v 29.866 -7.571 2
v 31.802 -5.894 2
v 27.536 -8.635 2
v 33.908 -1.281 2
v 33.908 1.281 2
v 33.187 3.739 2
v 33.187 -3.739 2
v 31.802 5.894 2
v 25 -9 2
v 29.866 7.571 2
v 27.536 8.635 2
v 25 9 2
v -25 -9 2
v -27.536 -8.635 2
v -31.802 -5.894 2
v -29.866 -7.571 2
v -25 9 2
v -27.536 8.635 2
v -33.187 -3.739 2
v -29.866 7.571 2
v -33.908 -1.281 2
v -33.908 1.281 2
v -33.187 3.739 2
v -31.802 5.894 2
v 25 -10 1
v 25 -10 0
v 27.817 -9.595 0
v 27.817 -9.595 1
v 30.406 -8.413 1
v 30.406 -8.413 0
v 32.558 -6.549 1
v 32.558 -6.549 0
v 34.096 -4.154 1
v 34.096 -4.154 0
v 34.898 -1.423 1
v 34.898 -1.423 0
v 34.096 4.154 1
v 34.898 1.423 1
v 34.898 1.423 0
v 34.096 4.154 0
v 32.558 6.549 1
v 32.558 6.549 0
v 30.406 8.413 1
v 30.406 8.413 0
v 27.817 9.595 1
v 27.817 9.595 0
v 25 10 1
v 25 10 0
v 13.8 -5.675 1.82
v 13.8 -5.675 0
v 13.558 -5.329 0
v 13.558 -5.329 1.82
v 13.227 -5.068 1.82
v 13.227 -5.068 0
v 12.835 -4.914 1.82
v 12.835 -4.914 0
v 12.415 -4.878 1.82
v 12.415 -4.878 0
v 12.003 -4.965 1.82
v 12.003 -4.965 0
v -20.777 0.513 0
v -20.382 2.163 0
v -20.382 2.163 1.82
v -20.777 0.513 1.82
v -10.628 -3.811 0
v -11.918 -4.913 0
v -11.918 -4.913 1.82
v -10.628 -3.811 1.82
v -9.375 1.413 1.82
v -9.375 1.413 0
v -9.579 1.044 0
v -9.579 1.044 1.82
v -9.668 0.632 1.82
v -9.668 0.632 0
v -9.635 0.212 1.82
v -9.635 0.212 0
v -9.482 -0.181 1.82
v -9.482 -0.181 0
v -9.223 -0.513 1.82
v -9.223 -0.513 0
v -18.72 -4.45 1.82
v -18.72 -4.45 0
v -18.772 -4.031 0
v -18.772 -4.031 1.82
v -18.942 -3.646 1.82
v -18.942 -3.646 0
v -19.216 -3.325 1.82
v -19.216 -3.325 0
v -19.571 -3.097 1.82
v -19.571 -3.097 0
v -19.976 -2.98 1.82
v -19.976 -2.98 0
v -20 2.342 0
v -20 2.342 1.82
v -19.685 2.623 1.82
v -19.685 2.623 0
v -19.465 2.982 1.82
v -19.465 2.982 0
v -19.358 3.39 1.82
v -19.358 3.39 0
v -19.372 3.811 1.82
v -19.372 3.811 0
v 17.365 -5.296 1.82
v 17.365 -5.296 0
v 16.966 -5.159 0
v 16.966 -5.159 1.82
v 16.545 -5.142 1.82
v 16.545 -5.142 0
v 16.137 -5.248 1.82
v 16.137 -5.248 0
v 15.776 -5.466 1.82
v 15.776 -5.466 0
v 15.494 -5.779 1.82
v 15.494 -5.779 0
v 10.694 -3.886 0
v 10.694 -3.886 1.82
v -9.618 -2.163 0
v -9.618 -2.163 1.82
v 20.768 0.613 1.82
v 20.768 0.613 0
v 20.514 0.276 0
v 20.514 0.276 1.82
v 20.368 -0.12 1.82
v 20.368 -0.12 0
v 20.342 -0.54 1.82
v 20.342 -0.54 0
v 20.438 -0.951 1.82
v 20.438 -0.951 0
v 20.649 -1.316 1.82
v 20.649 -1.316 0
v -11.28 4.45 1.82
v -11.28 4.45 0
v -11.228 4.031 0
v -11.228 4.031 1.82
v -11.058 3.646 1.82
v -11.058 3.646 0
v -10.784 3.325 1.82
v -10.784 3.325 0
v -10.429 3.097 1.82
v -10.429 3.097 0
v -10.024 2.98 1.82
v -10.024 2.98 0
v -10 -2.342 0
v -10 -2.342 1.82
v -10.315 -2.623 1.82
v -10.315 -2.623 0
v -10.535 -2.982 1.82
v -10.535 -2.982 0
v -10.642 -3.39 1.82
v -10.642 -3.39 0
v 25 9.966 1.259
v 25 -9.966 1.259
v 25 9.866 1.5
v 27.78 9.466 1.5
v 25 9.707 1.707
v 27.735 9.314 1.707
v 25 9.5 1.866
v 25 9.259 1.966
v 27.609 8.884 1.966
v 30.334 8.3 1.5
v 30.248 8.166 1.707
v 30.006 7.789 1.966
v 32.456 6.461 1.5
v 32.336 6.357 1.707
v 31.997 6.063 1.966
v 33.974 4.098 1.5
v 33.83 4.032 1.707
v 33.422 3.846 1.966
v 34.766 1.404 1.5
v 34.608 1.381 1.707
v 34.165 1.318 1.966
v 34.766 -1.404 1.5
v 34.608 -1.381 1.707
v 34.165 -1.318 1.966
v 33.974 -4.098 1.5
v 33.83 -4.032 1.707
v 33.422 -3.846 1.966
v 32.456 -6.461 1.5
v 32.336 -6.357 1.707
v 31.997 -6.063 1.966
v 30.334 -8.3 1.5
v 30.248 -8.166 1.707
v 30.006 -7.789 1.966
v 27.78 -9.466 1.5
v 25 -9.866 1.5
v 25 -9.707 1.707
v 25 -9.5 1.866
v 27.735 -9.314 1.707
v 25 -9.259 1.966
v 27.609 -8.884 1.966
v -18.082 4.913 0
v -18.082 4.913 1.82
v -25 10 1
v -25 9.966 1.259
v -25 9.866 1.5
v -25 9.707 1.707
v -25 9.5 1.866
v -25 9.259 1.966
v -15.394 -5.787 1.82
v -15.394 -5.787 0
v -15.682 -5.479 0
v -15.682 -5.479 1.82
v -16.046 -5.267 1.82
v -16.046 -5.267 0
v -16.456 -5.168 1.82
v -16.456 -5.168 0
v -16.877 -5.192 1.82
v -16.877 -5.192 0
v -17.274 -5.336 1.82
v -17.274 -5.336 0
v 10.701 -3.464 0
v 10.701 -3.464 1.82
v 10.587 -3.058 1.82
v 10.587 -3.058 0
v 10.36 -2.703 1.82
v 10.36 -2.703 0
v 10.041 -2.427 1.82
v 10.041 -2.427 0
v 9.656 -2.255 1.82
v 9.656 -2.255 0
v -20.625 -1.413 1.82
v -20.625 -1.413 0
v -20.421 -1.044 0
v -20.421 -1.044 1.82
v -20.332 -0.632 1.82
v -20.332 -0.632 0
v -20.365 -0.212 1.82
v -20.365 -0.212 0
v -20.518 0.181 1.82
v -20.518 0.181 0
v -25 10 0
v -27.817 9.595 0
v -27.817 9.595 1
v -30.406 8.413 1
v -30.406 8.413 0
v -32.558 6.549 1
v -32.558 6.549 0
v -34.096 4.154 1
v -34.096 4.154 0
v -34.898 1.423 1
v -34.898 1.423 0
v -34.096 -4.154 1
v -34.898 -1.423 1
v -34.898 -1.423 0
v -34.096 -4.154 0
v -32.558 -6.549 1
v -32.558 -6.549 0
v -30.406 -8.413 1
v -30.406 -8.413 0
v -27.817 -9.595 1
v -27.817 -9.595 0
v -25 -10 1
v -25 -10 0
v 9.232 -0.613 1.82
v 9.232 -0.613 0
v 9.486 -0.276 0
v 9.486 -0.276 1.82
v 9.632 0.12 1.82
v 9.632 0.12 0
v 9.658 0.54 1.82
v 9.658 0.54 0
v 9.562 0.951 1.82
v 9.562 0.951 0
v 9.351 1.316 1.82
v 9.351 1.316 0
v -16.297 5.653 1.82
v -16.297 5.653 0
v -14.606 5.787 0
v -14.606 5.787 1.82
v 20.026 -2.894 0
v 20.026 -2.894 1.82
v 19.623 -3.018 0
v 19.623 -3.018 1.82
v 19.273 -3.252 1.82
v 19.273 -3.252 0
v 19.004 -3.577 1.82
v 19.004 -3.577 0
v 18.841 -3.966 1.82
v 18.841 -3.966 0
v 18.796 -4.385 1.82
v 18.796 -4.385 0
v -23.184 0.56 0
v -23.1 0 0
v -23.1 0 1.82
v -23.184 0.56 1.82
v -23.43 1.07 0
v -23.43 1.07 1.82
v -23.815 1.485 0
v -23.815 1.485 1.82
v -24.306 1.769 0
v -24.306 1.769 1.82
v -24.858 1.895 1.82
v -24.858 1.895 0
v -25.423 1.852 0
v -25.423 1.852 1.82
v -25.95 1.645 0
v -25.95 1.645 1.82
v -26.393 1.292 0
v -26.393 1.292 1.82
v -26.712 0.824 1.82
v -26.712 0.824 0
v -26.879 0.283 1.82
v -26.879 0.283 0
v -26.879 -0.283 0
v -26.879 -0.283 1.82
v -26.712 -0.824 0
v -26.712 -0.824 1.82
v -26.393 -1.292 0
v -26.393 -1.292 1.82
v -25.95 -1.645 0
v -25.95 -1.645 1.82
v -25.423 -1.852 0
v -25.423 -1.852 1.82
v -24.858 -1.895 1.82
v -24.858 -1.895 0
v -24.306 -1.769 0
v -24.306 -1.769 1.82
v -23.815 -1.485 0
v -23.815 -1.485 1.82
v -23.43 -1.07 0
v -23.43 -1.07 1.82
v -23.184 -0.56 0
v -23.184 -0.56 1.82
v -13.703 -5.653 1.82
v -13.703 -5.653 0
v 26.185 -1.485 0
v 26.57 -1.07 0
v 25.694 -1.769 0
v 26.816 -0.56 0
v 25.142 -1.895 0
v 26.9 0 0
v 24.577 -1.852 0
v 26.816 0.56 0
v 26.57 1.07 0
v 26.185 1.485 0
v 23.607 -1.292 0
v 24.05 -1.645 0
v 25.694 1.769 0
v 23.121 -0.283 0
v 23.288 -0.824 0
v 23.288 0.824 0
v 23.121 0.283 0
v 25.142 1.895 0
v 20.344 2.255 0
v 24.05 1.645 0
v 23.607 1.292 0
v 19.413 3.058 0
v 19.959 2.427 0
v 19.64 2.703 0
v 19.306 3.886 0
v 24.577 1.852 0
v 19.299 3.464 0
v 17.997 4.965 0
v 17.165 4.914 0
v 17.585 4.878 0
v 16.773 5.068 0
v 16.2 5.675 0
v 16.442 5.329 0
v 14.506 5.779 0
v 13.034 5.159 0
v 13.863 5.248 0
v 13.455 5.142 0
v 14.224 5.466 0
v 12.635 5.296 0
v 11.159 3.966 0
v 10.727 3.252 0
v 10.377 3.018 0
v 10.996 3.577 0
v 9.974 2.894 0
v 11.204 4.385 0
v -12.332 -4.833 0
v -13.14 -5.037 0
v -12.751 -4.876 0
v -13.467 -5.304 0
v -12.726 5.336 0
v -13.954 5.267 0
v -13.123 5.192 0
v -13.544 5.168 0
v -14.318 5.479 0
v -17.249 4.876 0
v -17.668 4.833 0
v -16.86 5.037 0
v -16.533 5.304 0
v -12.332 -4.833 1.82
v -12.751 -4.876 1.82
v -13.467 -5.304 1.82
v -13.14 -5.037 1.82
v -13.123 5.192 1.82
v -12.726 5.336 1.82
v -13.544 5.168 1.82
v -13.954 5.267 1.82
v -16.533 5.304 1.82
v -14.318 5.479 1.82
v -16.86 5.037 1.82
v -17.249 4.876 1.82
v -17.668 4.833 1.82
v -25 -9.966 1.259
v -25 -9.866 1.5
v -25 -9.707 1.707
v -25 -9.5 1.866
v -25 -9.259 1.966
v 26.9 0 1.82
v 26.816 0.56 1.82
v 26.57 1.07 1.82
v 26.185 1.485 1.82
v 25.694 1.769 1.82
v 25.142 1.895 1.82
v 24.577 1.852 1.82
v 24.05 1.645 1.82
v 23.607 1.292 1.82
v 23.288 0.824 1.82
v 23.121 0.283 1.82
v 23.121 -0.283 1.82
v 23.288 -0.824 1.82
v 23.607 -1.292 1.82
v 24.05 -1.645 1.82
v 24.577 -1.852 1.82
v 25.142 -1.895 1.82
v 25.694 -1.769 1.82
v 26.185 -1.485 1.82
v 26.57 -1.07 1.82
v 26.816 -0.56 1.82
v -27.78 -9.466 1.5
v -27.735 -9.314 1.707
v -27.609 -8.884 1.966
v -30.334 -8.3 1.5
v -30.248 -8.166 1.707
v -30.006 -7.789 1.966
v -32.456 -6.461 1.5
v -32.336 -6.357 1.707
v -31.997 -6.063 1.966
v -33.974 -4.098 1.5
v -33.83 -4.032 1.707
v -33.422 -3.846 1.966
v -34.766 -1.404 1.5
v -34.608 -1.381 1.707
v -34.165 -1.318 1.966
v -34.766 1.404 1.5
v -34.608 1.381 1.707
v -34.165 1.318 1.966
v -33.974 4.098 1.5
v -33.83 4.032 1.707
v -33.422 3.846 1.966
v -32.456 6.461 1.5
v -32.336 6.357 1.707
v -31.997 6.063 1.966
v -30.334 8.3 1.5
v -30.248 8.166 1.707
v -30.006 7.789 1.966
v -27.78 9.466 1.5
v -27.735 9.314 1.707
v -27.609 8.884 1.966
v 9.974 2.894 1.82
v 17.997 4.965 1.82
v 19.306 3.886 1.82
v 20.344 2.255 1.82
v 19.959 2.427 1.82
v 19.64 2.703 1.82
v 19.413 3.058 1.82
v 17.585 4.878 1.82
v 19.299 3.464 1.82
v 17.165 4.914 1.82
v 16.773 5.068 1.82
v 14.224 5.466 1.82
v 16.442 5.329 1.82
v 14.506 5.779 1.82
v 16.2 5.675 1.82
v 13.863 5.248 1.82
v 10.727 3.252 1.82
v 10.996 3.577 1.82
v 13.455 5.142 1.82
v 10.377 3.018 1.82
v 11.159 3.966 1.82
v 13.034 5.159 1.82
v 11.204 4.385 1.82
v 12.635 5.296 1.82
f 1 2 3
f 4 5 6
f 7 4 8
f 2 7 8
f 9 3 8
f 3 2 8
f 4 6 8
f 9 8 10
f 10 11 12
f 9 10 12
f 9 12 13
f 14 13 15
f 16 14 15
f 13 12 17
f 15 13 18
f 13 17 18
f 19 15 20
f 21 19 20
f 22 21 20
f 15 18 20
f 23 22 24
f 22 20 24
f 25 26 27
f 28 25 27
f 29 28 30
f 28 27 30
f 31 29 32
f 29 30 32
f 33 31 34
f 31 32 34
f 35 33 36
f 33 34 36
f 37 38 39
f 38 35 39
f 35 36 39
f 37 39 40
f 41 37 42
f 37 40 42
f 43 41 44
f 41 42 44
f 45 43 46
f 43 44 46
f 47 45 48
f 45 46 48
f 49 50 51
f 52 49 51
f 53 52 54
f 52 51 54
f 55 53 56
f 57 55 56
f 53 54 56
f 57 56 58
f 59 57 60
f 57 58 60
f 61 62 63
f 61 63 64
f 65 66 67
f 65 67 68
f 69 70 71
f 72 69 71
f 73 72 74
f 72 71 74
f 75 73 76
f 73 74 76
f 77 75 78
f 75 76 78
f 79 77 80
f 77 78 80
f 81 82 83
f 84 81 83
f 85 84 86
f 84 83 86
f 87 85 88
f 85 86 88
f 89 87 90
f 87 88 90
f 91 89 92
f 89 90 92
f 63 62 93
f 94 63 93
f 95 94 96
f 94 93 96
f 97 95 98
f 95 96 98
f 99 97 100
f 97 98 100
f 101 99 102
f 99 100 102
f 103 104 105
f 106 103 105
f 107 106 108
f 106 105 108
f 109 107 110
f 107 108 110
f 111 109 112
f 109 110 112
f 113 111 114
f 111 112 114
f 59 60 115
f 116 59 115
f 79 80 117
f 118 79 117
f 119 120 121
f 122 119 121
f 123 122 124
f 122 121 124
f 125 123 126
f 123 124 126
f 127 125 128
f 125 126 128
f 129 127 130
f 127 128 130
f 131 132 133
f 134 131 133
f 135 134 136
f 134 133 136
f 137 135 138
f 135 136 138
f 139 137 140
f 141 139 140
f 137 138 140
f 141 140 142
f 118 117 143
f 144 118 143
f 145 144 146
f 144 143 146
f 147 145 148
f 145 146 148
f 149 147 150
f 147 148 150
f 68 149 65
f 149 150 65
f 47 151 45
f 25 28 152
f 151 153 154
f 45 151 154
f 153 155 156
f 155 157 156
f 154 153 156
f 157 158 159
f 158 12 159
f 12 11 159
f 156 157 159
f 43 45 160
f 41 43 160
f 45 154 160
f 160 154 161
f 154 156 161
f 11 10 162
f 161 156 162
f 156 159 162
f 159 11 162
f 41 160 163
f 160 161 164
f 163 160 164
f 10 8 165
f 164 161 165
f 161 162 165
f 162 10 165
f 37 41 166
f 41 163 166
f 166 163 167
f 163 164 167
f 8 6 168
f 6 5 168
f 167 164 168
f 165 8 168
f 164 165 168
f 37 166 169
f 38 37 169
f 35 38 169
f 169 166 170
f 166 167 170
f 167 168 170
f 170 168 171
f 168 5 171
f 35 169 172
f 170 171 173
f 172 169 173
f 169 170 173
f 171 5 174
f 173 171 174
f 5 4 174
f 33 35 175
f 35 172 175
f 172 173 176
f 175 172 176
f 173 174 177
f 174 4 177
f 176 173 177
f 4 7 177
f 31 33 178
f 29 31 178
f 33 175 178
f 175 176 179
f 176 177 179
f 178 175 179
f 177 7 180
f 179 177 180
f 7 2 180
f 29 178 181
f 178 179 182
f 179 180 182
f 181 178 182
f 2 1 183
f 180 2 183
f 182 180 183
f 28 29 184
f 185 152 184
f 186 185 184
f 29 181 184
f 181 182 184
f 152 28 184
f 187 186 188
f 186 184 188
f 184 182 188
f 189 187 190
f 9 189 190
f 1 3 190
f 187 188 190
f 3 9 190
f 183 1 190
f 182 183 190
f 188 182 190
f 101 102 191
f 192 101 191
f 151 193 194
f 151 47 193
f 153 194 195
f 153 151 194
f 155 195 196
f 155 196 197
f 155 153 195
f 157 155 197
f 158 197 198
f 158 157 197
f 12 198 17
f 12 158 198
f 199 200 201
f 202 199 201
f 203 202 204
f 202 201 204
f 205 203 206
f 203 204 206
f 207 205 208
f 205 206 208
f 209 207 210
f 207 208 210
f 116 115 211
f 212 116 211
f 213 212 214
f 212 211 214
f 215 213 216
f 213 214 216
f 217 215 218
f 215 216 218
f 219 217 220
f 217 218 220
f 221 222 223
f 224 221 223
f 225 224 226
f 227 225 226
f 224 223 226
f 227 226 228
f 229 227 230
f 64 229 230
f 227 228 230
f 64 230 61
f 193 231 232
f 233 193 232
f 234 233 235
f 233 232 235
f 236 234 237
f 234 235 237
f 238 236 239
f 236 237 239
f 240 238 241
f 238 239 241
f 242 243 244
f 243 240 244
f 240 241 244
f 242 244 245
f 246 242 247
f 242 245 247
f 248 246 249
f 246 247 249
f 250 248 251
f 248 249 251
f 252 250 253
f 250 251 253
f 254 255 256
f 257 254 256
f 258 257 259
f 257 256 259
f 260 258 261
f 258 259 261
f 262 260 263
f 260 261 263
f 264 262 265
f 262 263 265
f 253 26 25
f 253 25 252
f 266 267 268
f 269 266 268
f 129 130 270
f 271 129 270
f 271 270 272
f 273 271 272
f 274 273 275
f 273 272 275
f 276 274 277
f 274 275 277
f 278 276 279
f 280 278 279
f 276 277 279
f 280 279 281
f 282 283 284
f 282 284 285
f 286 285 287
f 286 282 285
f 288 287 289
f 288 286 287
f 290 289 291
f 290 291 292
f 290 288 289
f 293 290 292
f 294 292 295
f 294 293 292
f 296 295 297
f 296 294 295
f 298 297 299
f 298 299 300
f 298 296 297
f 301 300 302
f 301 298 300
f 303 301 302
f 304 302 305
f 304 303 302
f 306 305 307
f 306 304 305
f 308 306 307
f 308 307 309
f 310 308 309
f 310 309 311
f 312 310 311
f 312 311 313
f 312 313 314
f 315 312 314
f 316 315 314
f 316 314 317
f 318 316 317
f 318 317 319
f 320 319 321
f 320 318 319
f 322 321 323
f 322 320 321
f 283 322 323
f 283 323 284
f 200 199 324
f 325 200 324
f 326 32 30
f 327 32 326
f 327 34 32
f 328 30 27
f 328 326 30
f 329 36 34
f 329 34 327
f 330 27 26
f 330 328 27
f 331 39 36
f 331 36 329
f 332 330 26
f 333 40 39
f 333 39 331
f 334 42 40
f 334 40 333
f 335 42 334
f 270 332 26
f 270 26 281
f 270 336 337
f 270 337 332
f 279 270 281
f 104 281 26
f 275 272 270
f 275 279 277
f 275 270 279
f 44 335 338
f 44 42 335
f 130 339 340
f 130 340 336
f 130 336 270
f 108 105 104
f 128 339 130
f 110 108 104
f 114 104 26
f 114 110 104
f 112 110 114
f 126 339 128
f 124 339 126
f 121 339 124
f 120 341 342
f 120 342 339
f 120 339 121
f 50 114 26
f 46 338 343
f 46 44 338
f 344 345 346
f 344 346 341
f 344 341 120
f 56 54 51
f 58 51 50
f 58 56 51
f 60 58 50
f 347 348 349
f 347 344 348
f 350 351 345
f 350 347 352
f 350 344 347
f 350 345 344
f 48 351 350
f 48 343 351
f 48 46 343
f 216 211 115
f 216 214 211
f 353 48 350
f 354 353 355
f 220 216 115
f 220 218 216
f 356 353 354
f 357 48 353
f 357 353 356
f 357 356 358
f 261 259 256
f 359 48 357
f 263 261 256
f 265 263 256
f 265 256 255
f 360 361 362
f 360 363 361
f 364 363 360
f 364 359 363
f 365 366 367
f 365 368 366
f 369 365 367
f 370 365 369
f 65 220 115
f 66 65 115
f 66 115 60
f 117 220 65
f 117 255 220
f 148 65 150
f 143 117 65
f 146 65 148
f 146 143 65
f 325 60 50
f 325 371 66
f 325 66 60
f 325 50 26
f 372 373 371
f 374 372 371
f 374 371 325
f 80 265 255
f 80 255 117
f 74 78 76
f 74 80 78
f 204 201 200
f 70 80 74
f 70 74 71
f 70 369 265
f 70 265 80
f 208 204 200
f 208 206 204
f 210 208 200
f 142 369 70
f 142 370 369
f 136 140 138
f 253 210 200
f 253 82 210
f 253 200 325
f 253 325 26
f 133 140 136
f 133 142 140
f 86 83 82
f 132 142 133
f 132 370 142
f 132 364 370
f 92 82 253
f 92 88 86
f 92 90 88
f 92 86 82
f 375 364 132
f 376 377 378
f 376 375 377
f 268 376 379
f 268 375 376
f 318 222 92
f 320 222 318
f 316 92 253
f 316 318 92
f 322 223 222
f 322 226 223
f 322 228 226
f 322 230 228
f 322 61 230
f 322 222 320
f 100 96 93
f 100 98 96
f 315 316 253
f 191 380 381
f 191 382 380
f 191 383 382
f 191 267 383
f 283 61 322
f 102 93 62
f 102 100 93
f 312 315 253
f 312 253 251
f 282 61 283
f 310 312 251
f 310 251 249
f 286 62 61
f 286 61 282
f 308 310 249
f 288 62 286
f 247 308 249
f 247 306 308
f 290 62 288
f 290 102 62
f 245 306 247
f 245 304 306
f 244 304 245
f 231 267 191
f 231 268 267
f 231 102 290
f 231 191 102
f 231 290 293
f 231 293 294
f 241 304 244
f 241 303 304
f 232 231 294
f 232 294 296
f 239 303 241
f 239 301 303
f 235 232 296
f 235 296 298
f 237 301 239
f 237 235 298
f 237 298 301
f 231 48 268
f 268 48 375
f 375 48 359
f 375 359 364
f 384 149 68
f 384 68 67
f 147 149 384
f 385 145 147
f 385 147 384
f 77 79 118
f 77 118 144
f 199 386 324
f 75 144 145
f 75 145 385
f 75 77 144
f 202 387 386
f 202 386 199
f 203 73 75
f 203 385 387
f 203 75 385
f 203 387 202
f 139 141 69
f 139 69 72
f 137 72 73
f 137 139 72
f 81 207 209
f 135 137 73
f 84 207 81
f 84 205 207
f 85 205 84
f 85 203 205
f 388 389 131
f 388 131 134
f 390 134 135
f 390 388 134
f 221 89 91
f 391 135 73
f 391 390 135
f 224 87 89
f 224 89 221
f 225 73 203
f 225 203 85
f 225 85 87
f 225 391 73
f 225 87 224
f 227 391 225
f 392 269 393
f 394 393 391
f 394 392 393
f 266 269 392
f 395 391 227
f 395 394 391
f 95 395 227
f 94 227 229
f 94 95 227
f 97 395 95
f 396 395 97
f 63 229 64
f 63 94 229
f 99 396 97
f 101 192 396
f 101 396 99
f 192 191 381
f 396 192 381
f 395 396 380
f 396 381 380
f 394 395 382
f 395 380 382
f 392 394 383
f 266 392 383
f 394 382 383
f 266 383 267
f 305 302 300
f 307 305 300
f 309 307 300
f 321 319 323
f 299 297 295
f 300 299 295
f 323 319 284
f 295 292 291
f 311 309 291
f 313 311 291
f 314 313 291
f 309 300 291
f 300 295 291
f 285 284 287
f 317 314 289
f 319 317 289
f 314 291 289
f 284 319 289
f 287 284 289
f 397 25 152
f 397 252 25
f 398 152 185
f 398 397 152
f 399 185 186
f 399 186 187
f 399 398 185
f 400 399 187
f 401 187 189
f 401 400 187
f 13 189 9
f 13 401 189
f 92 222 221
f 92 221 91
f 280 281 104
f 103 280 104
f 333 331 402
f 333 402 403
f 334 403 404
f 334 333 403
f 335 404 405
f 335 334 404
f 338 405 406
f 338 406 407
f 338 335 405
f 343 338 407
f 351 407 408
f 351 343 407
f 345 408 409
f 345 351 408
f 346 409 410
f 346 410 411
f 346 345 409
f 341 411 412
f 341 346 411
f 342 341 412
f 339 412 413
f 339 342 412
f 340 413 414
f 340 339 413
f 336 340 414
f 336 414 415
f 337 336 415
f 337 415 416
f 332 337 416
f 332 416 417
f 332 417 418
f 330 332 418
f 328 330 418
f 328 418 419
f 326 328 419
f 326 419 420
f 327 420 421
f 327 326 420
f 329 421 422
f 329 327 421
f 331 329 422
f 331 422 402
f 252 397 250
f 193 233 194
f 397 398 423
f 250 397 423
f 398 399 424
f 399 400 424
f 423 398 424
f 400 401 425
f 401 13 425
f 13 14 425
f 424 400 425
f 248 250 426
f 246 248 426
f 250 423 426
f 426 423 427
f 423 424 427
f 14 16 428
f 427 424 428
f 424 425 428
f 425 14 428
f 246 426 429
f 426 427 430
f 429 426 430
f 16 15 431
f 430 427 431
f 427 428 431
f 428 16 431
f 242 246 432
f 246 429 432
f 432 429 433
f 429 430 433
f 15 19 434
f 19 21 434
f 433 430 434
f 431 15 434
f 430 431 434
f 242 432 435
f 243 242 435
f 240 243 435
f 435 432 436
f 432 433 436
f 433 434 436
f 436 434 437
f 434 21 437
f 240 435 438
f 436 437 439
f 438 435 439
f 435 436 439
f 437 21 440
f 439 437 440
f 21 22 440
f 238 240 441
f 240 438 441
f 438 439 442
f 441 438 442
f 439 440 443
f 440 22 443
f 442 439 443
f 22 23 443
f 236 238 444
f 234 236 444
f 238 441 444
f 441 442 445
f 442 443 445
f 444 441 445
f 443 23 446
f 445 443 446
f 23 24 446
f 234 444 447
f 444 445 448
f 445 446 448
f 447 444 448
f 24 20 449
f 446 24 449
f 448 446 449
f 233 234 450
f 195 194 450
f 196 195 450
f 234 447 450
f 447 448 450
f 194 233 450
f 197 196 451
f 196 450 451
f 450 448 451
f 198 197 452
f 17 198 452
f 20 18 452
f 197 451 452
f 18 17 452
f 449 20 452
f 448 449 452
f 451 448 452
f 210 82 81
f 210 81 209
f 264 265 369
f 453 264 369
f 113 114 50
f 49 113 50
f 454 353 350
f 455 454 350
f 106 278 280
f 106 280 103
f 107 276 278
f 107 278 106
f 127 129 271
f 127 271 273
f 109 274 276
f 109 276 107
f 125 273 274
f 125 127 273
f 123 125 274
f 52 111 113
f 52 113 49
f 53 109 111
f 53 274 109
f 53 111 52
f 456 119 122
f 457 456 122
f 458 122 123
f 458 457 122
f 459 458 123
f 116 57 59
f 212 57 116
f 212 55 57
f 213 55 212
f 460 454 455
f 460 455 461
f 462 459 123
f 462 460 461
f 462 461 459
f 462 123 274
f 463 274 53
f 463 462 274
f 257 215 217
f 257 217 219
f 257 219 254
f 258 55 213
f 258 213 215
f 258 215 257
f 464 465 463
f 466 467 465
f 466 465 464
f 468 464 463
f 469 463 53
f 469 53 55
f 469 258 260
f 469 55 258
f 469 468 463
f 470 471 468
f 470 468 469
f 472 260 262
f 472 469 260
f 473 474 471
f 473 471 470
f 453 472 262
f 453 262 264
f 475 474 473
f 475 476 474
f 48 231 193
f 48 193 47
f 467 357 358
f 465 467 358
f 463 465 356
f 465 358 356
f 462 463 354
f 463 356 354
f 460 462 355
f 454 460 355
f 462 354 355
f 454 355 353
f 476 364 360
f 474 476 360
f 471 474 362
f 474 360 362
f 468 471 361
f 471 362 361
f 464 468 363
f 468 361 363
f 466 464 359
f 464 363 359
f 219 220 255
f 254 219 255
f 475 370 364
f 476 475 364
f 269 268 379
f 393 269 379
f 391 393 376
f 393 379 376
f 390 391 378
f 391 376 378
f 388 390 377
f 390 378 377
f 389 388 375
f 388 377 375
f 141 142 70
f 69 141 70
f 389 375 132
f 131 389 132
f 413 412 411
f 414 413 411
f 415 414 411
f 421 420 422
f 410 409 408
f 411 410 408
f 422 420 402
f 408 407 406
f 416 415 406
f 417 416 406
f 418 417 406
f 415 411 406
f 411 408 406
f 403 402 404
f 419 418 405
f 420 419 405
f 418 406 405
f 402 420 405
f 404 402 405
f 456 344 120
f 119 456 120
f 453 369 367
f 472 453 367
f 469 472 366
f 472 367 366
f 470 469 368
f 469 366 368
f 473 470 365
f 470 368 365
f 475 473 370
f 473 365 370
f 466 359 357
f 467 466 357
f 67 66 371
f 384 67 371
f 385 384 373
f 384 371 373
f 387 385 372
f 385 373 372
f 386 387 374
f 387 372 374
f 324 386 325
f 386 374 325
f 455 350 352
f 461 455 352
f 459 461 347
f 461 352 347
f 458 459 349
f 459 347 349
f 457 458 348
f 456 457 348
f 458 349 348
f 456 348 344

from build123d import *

# Parameters (mm, degrees)
PAD_DEPTH    = 2
FILLET_R     = 1
SKETCH001_R  = 1.9
POCKET_DEPTH = 1.82


with BuildPart() as part:
    # Sketch → Pad (new body)
    with BuildSketch(Plane.XY):
        with BuildLine():
            Line((-25.000026, 10), (25.000026, 10))
            ThreePointArc((25.000026, -10), (35, 0), (25.000026, 10))
            Line((25.000026, -10), (-25.000026, -10))
            ThreePointArc((-25.000026, 10), (-35, 0), (-25.000026, -10))
        make_face()
    extrude(amount=PAD_DEPTH)

    # Fillet
    fillet_edges = [part.edges().sort_by_distance(p)[0] for p in [
        (0, -10, 2),
        (-35, 0, 2),
        (0, 10, 2),
        (35, 0, 2),
    ]]
    fillet(fillet_edges, radius=FILLET_R)

    # Sketch001 → Pocket (cut)
    with BuildSketch(Plane.XY):
        with Locations((-25, 0)):
            Circle(SKETCH001_R)
        with Locations((25, 0)):
            Circle(SKETCH001_R)
        with BuildLine():
            ThreePointArc((-14.605792, 5.786588), (-13.752163, 5.202442), (-12.726434, 5.335813))
            Line((-12.726434, 5.335813), (-11.279808, 4.449738))
            ThreePointArc((-11.279808, 4.449738), (-10.93256, 3.475404), (-10.024334, 2.980395))
            Line((-10.024334, 2.980395), (-9.374811, 1.41324))
            ThreePointArc((-9.374811, 1.41324), (-9.666581, 0.42088), (-9.22277, -0.513433))
            Line((-9.22277, -0.513433), (-9.618445, -2.163068))
            ThreePointArc((-9.618445, -2.163068), (-10.437786, -2.794406), (-10.627911, -3.811147))
            Line((-11.91765, -4.913158), (-10.627911, -3.811147))
            ThreePointArc((-11.91765, -4.913158), (-12.951602, -4.942324), (-13.703041, -5.653132))
            Line((-15.394208, -5.786588), (-13.703041, -5.653132))
            ThreePointArc((-15.394208, -5.786588), (-16.247837, -5.202442), (-17.273566, -5.335813))
            Line((-18.720192, -4.449738), (-17.273566, -5.335813))
            ThreePointArc((-18.720192, -4.449738), (-19.06744, -3.475404), (-19.975666, -2.980395))
            Line((-20.625189, -1.41324), (-19.975666, -2.980395))
            ThreePointArc((-20.625189, -1.41324), (-20.333419, -0.42088), (-20.77723, 0.513433))
            Line((-20.381555, 2.163068), (-20.77723, 0.513433))
            ThreePointArc((-20.381555, 2.163068), (-19.562214, 2.794406), (-19.372089, 3.811147))
            Line((-19.372089, 3.811147), (-18.08235, 4.913158))
            ThreePointArc((-18.08235, 4.913158), (-17.048398, 4.942324), (-16.296959, 5.653132))
            Line((-16.296959, 5.653132), (-14.605792, 5.786588))
        make_face()
        with BuildLine():
            Line((20.648644, -1.316367), (20.026146, -2.894452))
            ThreePointArc((20.026146, -2.894452), (19.126561, -3.404995), (18.796108, -4.385153))
            Line((18.796108, -4.385153), (17.364922, -5.295956))
            ThreePointArc((17.364922, -5.295956), (16.337052, -5.180231), (15.493588, -5.778959))
            Line((15.493588, -5.778959), (13.800377, -5.674584))
            ThreePointArc((13.800377, -5.674584), (13.036835, -4.976794), (12.002534, -4.9654))
            Line((12.002534, -4.9654), (10.694048, -3.885714))
            ThreePointArc((10.694048, -3.885714), (10.48648, -2.872392), (9.65641, -2.255226))
            Line((9.65641, -2.255226), (9.232446, -0.612634))
            ThreePointArc((9.232446, -0.612634), (9.660136, 0.329167), (9.351356, 1.316367))
            Line((9.351356, 1.316367), (9.973854, 2.894452))
            ThreePointArc((9.973854, 2.894452), (10.873439, 3.404995), (11.203892, 4.385153))
            Line((11.203892, 4.385153), (12.635078, 5.295956))
            ThreePointArc((12.635078, 5.295956), (13.662948, 5.180231), (14.506412, 5.778959))
            Line((14.506412, 5.778959), (16.199623, 5.674584))
            ThreePointArc((16.199623, 5.674584), (16.963165, 4.976794), (17.997466, 4.9654))
            Line((17.997466, 4.9654), (19.305952, 3.885714))
            ThreePointArc((19.305952, 3.885714), (19.51352, 2.872392), (20.34359, 2.255226))
            Line((20.34359, 2.255226), (20.767554, 0.612634))
            ThreePointArc((20.767554, 0.612634), (20.339864, -0.329167), (20.648644, -1.316367))
        make_face()
    extrude(amount=POCKET_DEPTH, mode=Mode.SUBTRACT)


solid = part.part
